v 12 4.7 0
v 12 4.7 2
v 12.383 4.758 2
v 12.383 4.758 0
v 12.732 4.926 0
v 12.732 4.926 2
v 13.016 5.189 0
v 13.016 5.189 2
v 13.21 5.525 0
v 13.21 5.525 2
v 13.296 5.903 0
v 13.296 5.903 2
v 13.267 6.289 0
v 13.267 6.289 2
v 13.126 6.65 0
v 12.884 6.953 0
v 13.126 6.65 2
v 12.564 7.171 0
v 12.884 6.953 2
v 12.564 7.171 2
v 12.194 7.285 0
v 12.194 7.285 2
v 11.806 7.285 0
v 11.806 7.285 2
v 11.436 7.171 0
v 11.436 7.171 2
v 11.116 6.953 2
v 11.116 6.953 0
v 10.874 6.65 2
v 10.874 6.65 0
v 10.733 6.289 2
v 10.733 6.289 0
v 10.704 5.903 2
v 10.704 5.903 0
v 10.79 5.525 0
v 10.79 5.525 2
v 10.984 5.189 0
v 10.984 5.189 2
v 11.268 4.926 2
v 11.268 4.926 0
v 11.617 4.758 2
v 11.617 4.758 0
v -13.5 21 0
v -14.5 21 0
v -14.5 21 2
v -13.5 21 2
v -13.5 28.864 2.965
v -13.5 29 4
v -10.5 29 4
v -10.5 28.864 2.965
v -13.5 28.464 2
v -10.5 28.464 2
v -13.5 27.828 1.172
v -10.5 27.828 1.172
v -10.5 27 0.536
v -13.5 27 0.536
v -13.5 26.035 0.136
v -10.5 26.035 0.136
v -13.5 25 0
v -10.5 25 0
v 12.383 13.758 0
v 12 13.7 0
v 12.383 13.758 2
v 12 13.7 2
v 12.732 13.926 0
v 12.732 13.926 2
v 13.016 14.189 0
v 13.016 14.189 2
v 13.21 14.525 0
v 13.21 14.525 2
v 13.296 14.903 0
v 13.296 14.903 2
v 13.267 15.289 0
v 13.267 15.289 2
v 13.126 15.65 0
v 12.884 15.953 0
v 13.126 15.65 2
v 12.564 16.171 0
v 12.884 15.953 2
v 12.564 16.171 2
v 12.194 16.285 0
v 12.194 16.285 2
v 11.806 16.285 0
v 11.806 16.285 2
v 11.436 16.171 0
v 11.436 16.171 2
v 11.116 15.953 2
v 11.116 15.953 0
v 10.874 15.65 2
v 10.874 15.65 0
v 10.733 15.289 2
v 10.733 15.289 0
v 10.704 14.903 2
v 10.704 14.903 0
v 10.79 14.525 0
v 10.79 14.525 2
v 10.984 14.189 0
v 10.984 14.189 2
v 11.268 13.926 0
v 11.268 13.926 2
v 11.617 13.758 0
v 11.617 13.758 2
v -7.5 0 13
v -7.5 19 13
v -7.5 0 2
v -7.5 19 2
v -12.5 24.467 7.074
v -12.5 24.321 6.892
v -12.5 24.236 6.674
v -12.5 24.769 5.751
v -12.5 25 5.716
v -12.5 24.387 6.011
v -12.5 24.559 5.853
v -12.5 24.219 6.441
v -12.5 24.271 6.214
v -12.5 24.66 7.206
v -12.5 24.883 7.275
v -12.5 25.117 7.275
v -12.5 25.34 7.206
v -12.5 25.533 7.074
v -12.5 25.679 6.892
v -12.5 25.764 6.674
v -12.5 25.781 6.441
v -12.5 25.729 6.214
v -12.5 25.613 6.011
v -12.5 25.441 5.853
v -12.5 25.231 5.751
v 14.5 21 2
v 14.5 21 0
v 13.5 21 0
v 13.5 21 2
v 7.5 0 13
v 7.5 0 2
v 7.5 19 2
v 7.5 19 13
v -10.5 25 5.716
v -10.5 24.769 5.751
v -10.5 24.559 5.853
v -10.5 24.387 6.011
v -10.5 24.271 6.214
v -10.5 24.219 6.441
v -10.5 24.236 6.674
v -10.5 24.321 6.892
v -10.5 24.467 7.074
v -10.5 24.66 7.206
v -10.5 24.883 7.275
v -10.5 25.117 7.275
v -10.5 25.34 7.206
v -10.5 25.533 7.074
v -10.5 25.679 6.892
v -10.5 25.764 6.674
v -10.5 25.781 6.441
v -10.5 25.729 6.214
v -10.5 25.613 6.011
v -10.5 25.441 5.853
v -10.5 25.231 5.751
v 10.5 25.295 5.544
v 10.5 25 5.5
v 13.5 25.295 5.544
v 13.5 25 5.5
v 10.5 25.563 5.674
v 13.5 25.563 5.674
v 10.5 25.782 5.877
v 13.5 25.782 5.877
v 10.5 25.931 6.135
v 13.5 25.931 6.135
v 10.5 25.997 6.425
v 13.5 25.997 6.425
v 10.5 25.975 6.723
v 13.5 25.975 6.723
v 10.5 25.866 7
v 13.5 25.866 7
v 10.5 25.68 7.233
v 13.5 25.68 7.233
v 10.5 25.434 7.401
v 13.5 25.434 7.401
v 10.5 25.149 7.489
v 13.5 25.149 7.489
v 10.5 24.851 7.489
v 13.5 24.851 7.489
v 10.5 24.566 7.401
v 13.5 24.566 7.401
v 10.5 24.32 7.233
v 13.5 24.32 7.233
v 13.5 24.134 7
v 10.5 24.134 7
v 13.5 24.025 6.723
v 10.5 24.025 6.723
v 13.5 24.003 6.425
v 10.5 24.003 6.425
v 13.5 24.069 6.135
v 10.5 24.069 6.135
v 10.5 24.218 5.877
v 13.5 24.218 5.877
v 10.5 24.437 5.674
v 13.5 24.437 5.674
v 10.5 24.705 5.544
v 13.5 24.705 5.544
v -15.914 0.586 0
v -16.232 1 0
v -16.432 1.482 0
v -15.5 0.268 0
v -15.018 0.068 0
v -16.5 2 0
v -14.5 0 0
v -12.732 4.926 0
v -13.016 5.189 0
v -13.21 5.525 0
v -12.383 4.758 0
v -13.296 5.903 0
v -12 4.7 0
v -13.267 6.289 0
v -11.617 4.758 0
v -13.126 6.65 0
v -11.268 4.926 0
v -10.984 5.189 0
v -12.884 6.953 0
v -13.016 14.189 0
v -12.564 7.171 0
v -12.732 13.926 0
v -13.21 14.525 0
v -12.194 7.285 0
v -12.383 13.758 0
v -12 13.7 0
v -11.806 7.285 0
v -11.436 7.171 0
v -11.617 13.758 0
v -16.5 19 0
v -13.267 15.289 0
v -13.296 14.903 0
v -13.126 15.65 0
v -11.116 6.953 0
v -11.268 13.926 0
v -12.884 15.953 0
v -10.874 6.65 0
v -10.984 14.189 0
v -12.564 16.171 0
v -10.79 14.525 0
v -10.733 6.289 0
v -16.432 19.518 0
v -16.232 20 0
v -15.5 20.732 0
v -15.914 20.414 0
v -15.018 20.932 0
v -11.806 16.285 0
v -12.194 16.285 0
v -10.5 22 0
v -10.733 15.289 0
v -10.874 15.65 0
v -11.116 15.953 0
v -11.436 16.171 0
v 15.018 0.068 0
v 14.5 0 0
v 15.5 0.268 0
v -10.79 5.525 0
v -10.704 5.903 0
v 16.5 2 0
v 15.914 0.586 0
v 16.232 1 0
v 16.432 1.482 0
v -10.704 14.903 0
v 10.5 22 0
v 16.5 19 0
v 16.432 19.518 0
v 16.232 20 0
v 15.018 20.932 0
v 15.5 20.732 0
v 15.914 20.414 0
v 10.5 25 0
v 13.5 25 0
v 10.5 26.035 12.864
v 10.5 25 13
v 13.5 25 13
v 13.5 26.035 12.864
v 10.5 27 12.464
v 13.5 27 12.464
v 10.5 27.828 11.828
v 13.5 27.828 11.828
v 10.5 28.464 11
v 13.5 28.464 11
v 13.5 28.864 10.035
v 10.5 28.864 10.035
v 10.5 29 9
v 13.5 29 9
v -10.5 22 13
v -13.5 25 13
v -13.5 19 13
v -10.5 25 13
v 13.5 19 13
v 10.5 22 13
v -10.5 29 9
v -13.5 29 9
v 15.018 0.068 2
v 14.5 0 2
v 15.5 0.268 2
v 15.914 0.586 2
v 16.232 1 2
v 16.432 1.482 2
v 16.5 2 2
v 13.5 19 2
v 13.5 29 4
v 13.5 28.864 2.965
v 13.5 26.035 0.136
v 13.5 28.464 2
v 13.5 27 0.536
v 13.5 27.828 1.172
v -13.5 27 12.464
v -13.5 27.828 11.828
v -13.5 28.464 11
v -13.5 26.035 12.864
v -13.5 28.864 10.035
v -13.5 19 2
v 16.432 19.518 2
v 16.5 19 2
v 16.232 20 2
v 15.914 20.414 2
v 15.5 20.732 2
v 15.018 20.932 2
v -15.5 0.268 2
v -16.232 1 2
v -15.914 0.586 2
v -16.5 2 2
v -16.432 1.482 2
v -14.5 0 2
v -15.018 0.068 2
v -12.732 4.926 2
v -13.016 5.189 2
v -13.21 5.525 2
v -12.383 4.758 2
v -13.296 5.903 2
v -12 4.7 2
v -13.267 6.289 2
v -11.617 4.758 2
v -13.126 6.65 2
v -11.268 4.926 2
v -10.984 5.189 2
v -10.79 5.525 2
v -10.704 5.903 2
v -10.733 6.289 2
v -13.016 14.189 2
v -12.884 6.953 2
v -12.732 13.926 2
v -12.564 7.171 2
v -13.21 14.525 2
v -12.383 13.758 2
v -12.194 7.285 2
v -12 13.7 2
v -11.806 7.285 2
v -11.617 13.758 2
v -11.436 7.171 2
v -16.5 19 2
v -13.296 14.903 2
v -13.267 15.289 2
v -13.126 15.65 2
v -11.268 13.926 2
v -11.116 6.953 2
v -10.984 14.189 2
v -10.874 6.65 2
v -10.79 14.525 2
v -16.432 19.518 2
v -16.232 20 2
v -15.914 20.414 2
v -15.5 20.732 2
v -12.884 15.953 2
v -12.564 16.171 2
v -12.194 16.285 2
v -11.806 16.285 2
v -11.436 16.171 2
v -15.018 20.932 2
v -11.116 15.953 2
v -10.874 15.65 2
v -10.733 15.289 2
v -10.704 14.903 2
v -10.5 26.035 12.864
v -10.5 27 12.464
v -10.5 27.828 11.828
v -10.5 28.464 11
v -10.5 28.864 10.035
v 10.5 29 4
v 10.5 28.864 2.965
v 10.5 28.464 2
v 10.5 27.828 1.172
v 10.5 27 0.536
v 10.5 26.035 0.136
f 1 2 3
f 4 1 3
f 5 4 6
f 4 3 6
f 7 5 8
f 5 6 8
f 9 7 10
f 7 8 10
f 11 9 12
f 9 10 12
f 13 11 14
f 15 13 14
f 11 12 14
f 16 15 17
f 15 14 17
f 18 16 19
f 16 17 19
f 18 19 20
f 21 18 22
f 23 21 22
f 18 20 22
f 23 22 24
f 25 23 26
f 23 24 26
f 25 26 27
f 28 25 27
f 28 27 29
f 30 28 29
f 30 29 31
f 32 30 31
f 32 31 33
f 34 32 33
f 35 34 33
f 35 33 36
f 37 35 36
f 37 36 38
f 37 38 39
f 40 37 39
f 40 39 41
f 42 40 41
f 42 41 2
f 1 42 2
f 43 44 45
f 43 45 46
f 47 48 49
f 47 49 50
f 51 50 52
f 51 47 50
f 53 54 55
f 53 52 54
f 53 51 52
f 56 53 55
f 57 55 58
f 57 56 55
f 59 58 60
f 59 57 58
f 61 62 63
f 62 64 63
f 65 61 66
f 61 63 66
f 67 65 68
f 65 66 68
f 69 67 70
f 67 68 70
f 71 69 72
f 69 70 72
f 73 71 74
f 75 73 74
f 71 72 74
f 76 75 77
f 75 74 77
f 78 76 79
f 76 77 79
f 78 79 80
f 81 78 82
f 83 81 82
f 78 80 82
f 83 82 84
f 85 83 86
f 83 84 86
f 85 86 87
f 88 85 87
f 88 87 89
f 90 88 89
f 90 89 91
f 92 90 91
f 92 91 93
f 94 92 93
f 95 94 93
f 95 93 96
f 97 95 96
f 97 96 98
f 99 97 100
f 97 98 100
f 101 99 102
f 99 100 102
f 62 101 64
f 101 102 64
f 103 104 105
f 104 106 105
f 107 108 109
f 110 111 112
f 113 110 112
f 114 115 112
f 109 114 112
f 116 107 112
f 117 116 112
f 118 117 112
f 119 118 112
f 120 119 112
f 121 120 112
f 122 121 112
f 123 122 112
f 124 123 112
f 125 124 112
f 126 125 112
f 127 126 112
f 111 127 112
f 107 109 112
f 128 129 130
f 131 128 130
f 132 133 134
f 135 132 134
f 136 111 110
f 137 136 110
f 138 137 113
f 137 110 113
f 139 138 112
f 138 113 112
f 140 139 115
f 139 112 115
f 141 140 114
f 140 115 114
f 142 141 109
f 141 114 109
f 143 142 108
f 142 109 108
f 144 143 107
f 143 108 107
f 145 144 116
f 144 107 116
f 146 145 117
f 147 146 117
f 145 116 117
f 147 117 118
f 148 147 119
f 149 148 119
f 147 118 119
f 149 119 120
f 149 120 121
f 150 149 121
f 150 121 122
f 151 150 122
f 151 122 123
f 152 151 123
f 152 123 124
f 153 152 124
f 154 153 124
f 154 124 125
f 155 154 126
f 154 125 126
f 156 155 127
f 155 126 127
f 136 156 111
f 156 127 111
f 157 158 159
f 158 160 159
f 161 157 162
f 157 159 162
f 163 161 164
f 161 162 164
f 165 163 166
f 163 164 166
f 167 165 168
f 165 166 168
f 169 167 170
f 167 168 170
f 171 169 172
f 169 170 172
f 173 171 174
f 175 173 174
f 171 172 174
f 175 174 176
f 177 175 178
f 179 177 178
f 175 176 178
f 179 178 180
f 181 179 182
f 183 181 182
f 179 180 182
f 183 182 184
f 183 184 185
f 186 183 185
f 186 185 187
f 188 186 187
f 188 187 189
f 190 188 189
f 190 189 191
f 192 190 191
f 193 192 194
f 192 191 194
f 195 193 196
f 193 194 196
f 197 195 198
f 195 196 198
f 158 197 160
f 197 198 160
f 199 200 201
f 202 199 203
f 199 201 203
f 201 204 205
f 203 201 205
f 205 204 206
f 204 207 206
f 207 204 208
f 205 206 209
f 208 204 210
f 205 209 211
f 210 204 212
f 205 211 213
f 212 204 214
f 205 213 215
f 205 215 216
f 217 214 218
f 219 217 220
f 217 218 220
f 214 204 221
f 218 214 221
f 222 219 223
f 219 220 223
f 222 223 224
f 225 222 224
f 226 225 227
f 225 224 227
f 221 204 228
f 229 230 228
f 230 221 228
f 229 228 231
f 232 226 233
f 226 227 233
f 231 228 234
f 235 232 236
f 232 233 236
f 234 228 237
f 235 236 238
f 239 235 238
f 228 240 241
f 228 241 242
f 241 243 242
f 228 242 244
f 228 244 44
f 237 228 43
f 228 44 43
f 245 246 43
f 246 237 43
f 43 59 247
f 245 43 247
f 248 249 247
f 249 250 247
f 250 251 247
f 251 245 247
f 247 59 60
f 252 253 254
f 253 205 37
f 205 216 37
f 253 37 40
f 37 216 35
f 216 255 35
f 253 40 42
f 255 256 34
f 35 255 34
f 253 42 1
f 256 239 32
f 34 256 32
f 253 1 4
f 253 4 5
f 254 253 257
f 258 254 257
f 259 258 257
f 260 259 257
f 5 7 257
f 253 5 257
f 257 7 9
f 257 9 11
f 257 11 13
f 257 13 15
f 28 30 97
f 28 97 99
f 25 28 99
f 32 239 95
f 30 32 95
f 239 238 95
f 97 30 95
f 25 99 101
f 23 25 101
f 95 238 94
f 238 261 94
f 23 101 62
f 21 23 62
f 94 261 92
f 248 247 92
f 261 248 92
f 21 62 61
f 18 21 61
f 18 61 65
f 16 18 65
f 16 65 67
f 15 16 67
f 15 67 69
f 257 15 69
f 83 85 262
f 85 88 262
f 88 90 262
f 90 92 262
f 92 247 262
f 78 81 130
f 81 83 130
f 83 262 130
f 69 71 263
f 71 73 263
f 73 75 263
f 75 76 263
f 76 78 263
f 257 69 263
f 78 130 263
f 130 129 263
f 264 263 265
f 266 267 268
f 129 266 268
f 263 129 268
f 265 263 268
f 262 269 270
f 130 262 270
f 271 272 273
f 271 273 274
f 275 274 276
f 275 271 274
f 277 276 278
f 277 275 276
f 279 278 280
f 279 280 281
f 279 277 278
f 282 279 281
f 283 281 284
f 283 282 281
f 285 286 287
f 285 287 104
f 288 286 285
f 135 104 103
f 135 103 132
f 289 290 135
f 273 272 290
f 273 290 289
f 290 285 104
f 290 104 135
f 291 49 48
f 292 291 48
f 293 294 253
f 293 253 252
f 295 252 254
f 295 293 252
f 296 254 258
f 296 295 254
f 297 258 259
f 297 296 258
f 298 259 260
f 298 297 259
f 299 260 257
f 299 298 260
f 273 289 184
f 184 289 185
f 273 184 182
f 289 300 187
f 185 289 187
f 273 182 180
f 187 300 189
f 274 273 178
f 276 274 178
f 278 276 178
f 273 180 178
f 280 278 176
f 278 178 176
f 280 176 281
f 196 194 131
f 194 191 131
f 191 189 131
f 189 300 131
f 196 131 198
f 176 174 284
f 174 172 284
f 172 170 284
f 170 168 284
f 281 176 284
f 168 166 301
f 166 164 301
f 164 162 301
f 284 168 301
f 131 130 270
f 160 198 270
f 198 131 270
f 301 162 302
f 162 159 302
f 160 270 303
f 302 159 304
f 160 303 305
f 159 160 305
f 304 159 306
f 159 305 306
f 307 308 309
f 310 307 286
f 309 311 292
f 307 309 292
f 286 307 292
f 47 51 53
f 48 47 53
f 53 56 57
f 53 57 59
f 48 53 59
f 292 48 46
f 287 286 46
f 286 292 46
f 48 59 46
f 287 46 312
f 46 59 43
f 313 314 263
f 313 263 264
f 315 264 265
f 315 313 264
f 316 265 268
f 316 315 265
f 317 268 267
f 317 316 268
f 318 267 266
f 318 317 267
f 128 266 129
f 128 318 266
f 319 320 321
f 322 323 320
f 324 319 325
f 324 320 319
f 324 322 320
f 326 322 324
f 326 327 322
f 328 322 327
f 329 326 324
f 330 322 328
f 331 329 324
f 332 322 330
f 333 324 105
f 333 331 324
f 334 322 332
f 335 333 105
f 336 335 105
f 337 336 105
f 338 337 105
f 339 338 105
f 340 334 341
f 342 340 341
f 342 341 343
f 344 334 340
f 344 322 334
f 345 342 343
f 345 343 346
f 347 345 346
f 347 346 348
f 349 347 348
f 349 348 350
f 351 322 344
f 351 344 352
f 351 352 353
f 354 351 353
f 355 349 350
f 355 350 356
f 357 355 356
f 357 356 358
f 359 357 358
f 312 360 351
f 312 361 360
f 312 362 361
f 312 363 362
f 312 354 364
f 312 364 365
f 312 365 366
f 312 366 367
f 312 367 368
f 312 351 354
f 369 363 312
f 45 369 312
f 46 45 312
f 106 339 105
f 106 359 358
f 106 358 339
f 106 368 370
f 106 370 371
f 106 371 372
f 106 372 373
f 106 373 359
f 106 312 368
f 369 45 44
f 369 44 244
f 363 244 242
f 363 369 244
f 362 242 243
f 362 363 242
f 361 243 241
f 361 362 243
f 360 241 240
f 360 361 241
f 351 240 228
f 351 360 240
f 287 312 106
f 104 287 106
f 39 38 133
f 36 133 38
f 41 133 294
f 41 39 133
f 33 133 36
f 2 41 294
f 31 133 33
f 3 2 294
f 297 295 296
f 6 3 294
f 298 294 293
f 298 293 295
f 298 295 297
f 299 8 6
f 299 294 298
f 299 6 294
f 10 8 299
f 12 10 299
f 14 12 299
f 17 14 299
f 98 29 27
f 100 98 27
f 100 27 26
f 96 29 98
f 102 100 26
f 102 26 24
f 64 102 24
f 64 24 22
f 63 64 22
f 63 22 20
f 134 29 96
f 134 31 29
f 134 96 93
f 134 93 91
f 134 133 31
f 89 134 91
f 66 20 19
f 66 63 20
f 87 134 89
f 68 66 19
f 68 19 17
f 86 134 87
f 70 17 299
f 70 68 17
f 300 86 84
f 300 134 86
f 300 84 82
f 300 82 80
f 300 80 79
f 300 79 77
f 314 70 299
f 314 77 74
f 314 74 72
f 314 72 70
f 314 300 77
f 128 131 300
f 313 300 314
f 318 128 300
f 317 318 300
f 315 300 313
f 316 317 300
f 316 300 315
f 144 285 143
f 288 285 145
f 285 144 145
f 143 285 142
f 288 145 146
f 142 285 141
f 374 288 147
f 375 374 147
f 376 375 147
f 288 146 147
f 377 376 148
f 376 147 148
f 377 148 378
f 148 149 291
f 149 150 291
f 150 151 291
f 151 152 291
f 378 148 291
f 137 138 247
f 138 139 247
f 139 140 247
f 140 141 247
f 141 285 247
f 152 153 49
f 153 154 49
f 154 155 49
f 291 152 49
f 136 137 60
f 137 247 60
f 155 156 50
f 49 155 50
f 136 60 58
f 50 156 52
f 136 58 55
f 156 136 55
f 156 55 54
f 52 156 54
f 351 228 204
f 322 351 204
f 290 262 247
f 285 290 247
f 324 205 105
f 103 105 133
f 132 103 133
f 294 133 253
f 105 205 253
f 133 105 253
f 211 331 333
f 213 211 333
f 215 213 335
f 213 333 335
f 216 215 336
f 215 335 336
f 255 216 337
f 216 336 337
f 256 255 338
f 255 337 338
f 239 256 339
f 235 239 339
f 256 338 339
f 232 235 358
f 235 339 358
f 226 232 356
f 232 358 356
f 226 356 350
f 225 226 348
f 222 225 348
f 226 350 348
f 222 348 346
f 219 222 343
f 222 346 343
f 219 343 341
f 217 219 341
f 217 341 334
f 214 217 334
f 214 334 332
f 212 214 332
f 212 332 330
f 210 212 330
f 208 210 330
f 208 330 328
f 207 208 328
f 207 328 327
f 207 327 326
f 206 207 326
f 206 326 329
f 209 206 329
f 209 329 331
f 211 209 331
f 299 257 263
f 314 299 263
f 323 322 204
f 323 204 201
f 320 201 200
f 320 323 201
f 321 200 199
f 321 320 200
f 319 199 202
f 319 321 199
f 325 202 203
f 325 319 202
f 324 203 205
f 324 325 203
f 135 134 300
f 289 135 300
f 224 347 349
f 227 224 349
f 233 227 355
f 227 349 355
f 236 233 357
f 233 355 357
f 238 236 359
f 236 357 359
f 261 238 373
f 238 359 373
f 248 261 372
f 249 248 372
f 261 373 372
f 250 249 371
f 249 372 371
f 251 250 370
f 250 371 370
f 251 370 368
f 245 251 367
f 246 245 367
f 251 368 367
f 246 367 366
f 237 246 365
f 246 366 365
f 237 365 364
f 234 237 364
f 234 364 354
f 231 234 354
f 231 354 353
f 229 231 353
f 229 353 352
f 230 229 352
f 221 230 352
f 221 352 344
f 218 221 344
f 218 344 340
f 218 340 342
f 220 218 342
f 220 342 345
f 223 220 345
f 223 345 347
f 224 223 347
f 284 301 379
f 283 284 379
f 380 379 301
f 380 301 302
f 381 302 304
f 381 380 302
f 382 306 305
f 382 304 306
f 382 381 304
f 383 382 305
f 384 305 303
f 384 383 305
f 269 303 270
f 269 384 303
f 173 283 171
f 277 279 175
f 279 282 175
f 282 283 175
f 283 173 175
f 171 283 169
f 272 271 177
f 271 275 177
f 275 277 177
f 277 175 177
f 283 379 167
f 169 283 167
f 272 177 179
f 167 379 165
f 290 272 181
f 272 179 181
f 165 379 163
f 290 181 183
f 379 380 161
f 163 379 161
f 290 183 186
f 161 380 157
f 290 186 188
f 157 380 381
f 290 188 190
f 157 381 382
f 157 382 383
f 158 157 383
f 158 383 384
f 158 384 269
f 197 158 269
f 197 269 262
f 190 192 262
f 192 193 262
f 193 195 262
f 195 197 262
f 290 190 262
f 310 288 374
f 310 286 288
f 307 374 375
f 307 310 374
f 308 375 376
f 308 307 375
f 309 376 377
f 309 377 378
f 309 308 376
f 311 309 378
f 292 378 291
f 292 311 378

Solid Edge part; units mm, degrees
sketch "Sketch1" plane through (0, 0, 0) normal (0, 0, 1) x (1, 0, 0)
  line L0 (-7.5, 0) -> (7.5, 0)
  line L1 (7.5, 0) -> (7.5, 19)
  line L2 (7.5, 19) -> (13.5, 19)
  line L3 (13.5, 19) -> (13.5, 29)
  line L4 (13.5, 29) -> (10.5, 29)
  line L5 (10.5, 29) -> (10.5, 22)
  line L6 (10.5, 22) -> (-10.5, 22)
  line L7 (-10.5, 22) -> (-10.5, 29)
  line L8 (-10.5, 29) -> (-13.5, 29)
  line L9 (-13.5, 29) -> (-13.5, 19)
  line L10 (-13.5, 19) -> (-7.5, 19)
  line L11 (-7.5, 19) -> (-7.5, 0)
  dimension "D1" = 15
  dimension "D2" = 19
  dimension "D3" = 6
  dimension "D4" = 3
  dimension "D5" = 10
  dimension "D6" = 3
extrude "Protrusion1" add sketch "Sketch1" along normal blind 13
sketch "Sketch2" plane through (0, 0, 0) normal (0, 0, 1) x (1, 0, 0)
  line L0 (-16.5, 21) -> (-16.5, 0)
  line L1 (-16.5, 0) -> (-7.5, 0)
  line L2 (-7.5, 19) -> (-7.5, 0)
  line L3 (-13.5, 19) -> (-7.5, 19)
  line L4 (-13.5, 21) -> (-13.5, 19)
  line L5 (-16.5, 21) -> (-13.5, 21)
  line L6 (7.5, 0) -> (16.5, 0)
  line L7 (16.5, 0) -> (16.5, 21)
  line L8 (16.5, 21) -> (13.5, 21)
  line L9 (13.5, 19) -> (13.5, 21)
  line L10 (7.5, 19) -> (13.5, 19)
  line L11 (7.5, 0) -> (7.5, 19)
  dimension "D1" = 9
  dimension "D2" = 2
extrude "Attachment" add sketch "Sketch2" along normal blind 2
hole "Hole_1" at (13.5, 25, 6.5) direction (-1, 0, 0) diameter 2 end up to next
hole "Hole_2" at (-10.5, 25, 6.5) direction (-1, 0, 0) diameter 1.567 depth 2 thread major 2 thread length 2
hole "Hole___Attachment" at (12, 15, 2) direction (0, 0, -1) diameter 2.6 end up to next
pattern_linear "Pattern1" count 2 spacing 24 along (-1, 0, 0) count 2 spacing 9 along (0, -1, 0) of "Hole___Attachment"
fillet "Round___Attachment" radius 2 4 edges at (16.5, 21, 1) (16.5, 0, 1) (-16.5, 0, 1) (-16.5, 21, 1)
fillet "Round_2" radius 4 4 edges at (-12, 29, 13) (12, 29, 13) (-12, 29, 0) (12, 29, 0)
properties material "ABS Plastic, high impact"
